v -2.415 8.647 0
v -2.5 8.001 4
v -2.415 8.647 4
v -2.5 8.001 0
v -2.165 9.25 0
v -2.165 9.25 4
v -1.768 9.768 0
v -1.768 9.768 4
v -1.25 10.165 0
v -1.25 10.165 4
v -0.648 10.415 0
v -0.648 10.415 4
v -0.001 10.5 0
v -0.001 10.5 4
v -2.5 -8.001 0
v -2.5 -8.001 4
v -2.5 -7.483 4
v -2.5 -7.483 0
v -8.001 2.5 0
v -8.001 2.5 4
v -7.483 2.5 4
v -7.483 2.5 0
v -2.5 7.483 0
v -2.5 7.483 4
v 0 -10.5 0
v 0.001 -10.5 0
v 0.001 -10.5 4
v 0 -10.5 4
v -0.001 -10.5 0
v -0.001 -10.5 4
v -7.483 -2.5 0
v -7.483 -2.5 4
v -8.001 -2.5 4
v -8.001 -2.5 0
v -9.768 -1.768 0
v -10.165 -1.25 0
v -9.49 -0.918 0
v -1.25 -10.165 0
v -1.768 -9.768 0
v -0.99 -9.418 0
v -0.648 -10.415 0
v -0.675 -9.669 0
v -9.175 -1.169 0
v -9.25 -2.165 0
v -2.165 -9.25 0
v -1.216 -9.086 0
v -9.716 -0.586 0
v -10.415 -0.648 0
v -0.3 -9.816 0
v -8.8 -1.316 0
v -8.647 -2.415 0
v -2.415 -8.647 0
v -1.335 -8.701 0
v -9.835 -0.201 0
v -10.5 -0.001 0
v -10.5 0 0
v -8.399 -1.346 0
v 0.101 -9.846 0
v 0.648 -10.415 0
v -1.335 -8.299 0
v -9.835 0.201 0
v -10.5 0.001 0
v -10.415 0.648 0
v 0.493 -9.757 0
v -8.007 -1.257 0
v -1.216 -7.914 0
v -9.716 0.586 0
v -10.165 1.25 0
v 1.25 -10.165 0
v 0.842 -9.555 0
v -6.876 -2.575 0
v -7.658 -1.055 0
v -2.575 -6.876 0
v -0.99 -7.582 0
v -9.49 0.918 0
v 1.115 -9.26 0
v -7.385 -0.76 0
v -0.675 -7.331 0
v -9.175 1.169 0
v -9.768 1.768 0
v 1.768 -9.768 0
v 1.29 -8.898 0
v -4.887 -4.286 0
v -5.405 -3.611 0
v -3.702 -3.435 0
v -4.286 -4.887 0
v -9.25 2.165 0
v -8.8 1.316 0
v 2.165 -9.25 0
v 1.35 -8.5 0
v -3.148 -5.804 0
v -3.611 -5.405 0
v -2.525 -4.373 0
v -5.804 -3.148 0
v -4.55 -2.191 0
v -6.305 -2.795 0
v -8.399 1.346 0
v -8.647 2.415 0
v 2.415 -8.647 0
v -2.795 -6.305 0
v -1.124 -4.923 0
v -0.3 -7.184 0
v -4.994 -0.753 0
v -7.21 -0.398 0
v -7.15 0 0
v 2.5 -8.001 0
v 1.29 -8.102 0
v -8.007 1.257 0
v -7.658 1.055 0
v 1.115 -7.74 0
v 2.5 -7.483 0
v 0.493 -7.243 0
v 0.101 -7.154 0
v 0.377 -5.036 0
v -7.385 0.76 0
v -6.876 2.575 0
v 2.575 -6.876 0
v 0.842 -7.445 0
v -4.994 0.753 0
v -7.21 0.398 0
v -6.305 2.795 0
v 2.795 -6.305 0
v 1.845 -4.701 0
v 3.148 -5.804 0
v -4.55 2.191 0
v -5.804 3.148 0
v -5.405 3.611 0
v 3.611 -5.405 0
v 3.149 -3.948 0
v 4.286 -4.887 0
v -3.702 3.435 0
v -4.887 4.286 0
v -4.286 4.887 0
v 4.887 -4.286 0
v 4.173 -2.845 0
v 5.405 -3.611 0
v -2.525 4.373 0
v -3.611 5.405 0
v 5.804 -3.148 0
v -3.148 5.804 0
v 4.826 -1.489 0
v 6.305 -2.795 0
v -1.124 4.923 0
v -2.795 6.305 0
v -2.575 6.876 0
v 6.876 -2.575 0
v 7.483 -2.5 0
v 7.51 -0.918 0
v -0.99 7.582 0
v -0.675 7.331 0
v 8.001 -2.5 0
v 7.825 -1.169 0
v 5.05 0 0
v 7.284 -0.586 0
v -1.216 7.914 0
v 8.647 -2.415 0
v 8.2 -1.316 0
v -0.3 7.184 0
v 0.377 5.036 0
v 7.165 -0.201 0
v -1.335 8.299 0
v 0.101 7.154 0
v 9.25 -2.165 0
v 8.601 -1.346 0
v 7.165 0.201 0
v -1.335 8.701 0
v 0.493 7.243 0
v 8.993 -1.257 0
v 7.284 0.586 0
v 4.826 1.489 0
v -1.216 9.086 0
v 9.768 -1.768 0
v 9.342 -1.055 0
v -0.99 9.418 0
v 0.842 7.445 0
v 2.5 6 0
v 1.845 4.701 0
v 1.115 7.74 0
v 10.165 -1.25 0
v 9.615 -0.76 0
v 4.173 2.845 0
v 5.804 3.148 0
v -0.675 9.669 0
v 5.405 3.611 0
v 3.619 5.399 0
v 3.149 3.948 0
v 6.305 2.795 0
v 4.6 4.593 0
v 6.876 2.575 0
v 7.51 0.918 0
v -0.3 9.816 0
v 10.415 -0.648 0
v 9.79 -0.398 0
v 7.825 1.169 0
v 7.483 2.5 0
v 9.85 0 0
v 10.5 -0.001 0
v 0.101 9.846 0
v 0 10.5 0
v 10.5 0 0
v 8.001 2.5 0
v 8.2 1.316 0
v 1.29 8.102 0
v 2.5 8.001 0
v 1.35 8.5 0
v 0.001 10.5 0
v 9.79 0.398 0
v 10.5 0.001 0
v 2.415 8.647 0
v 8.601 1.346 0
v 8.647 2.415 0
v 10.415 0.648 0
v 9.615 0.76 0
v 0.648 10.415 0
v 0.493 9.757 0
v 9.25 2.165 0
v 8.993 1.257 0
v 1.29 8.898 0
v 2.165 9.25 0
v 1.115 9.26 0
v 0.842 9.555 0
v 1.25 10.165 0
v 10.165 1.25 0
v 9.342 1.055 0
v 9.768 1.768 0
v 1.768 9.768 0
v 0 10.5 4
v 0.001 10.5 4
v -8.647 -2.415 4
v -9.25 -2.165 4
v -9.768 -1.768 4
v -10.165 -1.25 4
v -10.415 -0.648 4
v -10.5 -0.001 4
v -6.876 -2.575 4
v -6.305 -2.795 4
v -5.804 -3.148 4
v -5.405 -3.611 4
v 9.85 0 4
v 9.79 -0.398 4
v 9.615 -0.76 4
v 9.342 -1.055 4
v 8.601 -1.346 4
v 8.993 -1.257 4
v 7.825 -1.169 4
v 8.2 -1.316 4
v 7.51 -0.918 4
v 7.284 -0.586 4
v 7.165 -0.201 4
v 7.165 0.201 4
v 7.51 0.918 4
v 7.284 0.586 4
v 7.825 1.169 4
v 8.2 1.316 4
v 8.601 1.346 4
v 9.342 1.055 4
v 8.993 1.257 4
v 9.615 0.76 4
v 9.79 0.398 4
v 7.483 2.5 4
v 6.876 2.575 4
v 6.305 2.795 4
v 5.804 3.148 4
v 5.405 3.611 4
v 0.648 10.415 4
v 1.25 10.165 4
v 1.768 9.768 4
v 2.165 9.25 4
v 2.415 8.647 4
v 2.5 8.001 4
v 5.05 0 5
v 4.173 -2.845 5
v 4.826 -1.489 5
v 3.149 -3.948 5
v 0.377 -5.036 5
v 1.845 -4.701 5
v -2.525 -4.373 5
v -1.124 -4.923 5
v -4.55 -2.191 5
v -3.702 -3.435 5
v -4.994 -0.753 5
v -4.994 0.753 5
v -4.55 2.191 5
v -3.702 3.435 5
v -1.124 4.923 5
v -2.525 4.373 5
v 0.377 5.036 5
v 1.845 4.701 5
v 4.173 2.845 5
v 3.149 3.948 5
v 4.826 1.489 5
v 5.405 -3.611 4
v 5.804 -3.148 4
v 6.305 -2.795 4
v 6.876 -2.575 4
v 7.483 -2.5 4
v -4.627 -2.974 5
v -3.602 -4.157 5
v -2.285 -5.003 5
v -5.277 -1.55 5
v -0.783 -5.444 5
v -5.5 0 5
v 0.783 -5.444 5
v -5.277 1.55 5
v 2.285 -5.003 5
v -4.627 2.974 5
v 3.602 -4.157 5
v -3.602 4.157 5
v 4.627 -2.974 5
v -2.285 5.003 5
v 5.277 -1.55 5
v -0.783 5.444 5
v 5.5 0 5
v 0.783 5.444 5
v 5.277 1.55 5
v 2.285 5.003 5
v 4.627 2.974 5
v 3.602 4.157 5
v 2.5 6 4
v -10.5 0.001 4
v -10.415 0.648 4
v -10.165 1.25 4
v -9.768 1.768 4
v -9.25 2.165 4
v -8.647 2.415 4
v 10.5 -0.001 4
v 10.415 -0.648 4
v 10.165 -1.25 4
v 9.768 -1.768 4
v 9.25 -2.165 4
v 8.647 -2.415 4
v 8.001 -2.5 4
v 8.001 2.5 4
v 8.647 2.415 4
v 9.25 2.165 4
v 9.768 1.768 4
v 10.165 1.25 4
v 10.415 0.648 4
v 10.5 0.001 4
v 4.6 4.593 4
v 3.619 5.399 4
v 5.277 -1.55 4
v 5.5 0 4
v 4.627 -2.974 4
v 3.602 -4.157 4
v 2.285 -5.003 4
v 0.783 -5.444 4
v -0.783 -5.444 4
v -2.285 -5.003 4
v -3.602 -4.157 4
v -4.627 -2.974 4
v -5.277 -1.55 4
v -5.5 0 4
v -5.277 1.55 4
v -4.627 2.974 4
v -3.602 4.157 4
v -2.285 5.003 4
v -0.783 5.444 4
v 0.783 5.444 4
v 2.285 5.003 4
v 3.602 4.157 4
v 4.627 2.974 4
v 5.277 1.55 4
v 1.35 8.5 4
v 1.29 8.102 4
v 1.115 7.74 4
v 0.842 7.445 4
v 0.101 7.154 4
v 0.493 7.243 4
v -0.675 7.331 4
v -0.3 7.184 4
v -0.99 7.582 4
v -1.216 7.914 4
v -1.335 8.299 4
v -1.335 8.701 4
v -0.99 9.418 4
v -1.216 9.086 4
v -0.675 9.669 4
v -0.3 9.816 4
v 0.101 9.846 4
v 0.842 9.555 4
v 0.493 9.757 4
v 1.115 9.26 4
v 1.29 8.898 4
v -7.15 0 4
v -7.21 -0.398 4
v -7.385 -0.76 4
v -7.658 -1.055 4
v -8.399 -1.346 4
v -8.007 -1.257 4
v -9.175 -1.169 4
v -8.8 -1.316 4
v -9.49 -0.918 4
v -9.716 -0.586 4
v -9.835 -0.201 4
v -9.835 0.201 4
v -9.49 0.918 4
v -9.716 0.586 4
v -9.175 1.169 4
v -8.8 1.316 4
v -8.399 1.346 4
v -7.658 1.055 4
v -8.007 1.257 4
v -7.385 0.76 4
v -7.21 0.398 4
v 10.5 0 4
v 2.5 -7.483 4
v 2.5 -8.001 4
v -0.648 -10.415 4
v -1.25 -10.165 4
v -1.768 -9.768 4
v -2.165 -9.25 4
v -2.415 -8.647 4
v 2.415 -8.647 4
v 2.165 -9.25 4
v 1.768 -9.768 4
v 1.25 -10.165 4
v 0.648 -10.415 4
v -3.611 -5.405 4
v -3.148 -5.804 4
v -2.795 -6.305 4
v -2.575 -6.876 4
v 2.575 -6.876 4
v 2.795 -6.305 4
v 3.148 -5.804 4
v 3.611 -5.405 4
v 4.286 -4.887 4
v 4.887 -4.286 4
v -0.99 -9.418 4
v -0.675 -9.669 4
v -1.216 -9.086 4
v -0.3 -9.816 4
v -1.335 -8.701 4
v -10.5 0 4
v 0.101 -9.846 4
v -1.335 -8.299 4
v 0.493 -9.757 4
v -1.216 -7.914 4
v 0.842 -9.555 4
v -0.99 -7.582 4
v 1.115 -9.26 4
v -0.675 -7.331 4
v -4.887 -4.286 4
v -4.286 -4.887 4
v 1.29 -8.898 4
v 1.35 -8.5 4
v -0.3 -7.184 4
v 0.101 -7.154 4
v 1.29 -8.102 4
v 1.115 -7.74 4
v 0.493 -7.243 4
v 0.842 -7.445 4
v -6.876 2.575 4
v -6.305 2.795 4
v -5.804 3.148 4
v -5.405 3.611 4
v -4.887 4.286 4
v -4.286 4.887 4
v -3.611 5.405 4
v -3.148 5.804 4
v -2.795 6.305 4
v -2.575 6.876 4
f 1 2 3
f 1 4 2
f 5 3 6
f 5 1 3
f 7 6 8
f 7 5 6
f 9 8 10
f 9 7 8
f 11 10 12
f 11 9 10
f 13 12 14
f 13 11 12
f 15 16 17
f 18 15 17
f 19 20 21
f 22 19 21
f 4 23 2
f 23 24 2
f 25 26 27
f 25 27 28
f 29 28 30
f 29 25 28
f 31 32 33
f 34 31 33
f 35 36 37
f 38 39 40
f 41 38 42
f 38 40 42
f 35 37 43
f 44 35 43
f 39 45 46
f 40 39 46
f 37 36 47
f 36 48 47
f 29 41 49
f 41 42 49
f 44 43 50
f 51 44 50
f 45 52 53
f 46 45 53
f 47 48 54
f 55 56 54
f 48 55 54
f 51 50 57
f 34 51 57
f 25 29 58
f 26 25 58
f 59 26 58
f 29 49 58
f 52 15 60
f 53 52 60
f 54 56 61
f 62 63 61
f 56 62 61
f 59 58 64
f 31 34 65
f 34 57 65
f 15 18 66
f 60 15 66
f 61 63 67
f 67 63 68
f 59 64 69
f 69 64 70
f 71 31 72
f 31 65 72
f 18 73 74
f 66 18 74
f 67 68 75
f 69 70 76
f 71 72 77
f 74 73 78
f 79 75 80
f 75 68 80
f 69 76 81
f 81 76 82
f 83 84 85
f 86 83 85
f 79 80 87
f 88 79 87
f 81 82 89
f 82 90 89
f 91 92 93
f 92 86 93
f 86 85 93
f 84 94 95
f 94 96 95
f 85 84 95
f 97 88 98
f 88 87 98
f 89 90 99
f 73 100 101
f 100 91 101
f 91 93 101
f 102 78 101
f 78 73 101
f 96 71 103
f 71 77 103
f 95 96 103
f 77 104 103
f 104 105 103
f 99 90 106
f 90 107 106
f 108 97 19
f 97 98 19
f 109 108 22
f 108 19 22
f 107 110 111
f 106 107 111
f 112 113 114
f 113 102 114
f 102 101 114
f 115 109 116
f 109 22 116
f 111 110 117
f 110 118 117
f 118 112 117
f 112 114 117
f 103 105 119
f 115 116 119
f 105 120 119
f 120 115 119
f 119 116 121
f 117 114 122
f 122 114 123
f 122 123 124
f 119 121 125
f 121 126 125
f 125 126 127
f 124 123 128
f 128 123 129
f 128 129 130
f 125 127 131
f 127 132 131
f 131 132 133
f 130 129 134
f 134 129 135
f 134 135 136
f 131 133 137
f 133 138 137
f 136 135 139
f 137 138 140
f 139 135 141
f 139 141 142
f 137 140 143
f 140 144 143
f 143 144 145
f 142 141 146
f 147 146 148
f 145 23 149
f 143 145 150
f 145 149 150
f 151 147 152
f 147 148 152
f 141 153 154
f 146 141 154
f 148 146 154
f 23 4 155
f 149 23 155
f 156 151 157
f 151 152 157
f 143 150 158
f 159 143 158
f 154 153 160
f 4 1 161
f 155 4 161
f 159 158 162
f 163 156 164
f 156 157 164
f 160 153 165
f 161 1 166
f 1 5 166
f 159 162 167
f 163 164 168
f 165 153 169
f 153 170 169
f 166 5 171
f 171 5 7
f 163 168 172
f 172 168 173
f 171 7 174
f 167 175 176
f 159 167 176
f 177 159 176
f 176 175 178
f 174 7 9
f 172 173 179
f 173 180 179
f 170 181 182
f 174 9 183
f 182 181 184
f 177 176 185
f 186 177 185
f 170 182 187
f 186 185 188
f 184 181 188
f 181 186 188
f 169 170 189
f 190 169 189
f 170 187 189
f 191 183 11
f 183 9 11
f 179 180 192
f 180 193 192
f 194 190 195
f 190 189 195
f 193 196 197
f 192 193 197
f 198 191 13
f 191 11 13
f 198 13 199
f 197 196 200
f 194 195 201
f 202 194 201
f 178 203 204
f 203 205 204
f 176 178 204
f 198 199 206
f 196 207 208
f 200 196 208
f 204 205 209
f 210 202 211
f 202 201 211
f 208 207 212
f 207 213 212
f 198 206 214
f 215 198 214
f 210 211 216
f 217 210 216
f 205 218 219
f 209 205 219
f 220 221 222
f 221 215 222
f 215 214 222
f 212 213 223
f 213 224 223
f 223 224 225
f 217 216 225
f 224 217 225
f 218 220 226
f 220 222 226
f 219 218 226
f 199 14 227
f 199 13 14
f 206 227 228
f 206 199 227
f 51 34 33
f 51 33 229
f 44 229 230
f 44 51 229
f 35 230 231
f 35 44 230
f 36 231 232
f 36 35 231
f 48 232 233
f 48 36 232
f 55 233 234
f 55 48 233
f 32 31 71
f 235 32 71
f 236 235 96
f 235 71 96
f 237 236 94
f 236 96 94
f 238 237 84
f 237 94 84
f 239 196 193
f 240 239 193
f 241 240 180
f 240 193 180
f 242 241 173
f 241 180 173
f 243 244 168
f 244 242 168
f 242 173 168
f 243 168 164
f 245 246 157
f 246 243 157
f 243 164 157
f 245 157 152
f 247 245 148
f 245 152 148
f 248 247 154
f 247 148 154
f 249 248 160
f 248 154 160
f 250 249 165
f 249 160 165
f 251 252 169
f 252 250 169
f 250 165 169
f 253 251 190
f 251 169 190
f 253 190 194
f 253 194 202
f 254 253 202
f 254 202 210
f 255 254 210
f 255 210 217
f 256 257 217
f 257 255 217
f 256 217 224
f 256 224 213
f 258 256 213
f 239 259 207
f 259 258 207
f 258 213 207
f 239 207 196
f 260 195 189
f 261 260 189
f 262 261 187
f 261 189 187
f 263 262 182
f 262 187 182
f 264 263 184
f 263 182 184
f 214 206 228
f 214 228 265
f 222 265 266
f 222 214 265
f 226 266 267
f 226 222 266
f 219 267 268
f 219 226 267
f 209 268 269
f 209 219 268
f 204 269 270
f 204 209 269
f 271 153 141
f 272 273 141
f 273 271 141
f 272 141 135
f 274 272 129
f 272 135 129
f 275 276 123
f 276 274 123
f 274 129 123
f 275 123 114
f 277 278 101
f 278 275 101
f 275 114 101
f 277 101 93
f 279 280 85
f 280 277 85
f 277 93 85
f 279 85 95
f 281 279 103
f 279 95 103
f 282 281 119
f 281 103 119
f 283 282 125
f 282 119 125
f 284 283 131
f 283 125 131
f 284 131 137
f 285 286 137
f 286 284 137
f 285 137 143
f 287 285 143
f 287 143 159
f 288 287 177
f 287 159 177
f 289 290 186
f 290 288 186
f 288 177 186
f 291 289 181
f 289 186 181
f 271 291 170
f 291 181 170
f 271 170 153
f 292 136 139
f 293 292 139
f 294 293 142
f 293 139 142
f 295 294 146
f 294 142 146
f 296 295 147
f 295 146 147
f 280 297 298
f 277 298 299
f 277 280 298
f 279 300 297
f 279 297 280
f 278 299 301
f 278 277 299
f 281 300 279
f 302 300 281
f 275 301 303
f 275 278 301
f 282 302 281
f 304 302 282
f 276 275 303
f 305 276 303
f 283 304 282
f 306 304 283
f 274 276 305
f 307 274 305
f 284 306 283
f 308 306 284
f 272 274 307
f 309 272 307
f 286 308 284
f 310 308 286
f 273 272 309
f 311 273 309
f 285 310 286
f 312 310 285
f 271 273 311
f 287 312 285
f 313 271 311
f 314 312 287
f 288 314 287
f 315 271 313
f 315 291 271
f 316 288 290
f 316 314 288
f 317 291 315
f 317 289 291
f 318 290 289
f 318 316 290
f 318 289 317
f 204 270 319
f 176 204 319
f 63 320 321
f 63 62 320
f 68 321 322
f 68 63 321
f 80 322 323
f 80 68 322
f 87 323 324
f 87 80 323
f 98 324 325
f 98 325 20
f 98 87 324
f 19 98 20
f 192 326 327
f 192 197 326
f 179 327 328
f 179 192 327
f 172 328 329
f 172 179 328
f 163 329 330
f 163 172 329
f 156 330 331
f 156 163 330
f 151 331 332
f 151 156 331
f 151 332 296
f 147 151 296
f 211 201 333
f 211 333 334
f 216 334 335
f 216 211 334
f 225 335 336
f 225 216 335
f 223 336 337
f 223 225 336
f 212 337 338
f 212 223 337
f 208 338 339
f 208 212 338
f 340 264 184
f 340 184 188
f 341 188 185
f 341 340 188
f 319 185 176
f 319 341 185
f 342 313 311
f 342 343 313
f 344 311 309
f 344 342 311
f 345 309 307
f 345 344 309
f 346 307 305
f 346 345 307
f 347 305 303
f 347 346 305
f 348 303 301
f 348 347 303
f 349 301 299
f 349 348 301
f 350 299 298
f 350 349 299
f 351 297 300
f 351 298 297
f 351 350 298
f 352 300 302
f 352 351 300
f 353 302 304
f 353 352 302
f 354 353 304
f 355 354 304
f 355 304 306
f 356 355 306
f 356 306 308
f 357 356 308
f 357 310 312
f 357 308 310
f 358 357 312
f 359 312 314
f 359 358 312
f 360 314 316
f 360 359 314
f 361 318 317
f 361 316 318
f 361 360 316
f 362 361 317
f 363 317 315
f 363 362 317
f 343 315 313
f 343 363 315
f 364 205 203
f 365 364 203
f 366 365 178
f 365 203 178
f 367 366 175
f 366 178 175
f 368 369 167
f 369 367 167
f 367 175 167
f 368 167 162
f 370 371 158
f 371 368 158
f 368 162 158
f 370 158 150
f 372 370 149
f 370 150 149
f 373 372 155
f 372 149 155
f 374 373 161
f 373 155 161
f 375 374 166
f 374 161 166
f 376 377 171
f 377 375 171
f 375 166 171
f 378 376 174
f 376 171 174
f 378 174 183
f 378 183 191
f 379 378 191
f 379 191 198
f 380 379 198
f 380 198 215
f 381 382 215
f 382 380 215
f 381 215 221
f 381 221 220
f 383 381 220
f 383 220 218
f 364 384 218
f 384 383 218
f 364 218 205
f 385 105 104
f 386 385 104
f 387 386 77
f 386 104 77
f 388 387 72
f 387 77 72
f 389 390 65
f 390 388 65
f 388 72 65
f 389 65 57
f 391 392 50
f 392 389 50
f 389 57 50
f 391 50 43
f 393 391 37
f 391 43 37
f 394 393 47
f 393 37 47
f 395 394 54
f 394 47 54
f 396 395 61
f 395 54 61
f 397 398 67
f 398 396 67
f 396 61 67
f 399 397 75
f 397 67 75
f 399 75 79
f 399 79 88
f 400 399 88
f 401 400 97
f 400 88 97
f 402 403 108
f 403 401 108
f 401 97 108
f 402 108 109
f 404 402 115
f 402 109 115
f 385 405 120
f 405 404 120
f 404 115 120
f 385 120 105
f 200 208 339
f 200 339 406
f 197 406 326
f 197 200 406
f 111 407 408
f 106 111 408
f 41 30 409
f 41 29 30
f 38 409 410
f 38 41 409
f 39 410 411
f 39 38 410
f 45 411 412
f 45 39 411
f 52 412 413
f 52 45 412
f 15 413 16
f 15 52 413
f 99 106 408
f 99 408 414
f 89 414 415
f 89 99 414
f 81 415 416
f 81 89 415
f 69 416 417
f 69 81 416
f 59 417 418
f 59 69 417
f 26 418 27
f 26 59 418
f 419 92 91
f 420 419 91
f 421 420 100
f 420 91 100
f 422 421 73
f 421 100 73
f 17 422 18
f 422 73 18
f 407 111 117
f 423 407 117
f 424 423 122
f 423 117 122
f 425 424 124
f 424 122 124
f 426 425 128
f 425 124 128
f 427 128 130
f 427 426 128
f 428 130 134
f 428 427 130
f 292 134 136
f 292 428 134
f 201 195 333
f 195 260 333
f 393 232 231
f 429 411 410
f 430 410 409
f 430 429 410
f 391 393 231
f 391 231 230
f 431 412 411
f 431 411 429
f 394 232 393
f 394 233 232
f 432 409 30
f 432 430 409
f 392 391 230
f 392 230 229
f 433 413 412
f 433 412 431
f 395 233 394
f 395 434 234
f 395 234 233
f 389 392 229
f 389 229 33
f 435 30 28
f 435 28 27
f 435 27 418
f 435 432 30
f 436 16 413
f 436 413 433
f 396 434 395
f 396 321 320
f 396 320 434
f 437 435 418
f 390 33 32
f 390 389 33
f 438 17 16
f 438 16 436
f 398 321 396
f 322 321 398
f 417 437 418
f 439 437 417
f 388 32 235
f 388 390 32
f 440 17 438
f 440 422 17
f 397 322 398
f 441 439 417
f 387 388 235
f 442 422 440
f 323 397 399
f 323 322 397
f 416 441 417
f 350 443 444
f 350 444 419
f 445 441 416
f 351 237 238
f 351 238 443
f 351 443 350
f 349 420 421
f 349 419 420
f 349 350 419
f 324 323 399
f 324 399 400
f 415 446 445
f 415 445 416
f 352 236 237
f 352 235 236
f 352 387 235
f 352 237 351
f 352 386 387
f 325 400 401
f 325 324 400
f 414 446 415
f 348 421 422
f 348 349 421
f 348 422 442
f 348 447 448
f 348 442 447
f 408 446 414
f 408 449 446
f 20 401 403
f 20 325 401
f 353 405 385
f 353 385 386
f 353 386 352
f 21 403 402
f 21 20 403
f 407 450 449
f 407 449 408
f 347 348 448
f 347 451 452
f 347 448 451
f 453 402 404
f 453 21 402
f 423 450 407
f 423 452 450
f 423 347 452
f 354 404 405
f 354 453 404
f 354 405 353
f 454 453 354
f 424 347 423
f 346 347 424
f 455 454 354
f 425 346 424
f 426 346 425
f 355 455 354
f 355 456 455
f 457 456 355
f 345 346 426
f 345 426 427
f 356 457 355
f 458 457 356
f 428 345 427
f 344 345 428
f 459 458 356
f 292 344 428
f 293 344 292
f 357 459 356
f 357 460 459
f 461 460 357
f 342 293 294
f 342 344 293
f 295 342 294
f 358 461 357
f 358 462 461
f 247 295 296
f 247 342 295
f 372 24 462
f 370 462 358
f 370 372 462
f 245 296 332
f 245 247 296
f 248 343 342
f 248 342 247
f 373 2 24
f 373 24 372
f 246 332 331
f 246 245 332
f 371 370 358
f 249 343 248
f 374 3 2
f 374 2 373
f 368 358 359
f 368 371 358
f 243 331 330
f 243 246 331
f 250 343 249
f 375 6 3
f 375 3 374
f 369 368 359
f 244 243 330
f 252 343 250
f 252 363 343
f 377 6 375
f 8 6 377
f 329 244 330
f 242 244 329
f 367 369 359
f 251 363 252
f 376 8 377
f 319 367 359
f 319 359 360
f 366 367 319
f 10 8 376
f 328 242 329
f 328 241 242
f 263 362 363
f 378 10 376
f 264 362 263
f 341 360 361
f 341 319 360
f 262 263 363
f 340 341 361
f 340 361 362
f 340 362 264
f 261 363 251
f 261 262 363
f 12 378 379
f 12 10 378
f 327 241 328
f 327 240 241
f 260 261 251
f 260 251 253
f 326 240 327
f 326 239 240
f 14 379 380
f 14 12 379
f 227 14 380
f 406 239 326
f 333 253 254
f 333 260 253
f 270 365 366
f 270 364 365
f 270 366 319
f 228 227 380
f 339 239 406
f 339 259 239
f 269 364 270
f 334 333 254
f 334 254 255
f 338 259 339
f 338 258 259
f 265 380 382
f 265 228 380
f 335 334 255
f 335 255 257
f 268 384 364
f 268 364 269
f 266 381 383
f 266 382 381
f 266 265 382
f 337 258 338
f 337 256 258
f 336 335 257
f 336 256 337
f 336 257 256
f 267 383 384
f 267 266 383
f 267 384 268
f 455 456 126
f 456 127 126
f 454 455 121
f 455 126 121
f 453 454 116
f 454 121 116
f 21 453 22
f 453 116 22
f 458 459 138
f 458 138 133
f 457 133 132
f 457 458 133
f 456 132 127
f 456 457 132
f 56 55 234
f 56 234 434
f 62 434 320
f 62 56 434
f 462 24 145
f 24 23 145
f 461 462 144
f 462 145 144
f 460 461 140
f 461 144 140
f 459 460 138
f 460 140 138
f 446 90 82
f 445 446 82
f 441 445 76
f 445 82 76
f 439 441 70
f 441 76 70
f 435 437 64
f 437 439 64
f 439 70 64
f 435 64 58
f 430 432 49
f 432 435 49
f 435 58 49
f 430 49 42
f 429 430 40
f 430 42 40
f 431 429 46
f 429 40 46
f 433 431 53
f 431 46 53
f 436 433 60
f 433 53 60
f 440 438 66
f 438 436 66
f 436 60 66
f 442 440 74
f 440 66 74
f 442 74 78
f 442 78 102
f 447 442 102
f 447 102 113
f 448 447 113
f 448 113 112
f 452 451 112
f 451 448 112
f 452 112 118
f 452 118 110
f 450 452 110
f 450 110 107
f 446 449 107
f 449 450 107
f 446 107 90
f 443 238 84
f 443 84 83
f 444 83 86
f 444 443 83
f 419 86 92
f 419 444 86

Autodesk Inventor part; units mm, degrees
ref_plane "YZ Plane" through (0, 0, 0) normal (1, 0, 0) x (0, 1, 0)
ref_plane "XZ Plane" through (0, 0, 0) normal (0, 1, 0) x (-1, 0, 0)
ref_plane "XY Plane" through (0, 0, 0) normal (0, 0, 1) x (1, 0, 0)
sketch "スケッチ1" plane through (0, 0, 0) normal (0, 0, 1) x (1, 0, 0)
  circle A0 centre (0, 0) radius 10.5
  circle A1 centre (0, 0) radius 5.05
  circle A2 centre (0, 8.5) radius 1.35
  circle A3 centre (-6.0104, 6.0104) radius 1.04
  line L0 (0, 8.5) -> (0, 0) construction
  line L1 (0, 0) -> (-6.0104, 6.0104) construction
  circle A4 centre (0, 0) radius 8.5 construction
  circle A5 centre (-8.5, 0) radius 1.35
  circle A6 centre (-6.0104, -6.0104) radius 1.04
  circle A7 centre (0, -8.5) radius 1.35
  circle A8 centre (6.0104, -6.0104) radius 1.04
  circle A9 centre (8.5, 0) radius 1.35
  circle A10 centre (6.0104, 6.0104) radius 1.04
  dimension "d0" = 21
  dimension "d1" = 10.1
  dimension "d2" = 2.7
  dimension "d3" = 45
  dimension "d4" = 2.08
  dimension "d5" = 17
  dimension "d8" = 360
extrude "押し出し1" add sketch "スケッチ1" along normal blind 4 contours A0 | A3 | A6 | A8 | A10
sketch "スケッチ2" plane through (0, 0, 4) normal (0, 0, 1) x (1, 0, 0)
  circle A0 centre (0, 0) radius 5.05 projected
  circle A1 centre (0, 0) radius 10.5 projected
  circle A2 centre (0, 0) radius 5.5
  dimension "d12" = 11
extrude "押し出し2" add sketch "スケッチ2" along normal blind 1 contours A2
sketch "スケッチ4" plane through (0, 0, 4) normal (0, 0, 1) x (1, 0, 0)
  circle A0 centre (0, 0) radius 5.5 projected
  circle A1 centre (-8.5, 0) radius 1.35 projected
  circle A2 centre (0, 8.5) radius 1.35 projected
  circle A3 centre (0, 0) radius 10.5 projected
  line L0 (0, 8.5) -> (0, 0) construction
  line L1 (0, 0) -> (-8.5, 0) construction
  line L2 (0, 0) -> (-7.4246, 7.4246) construction
  circle A4 centre (0, 0) radius 10.5 construction
  line L3 (-12.2474, 2.5) -> (-6, 2.5)
  line L4 (-2.5, 6) -> (-2.5, 12.2474)
  arc A5 (-2.5, 12.2474) -> (-12.2474, 2.5) centre (0, 0) ccw
  arc A6 (-2.5, 6) -> (-6, 2.5) centre (0, 0) ccw
  circle A7 centre (0, 0) radius 5.5 projected
  line L5 (-2.5, -12.2474) -> (-2.5, -6)
  line L6 (-6, -2.5) -> (-12.2474, -2.5)
  arc A8 (-12.2474, -2.5) -> (-2.5, -12.2474) centre (0, 0) ccw
  arc A9 (-6, -2.5) -> (-2.5, -6) centre (0, 0) ccw
  line L7 (12.2474, -2.5) -> (6, -2.5)
  line L8 (2.5, -6) -> (2.5, -12.2474)
  arc A10 (2.5, -12.2474) -> (12.2474, -2.5) centre (0, 0) ccw
  arc A11 (2.5, -6) -> (6, -2.5) centre (0, 0) ccw
  line L9 (2.5, 12.2474) -> (2.5, 6)
  line L10 (6, 2.5) -> (12.2474, 2.5)
  arc A12 (12.2474, 2.5) -> (2.5, 12.2474) centre (0, 0) ccw
  arc A13 (6, 2.5) -> (2.5, 6) centre (0, 0) ccw
  dimension "d24" = 45
  dimension "d25" = 2.5
  dimension "d26" = 2.5
  dimension "d27" = 2
  dimension "d30" = 360
  dimension "d35" = 1
extrude "押し出し4" cut sketch "スケッチ4" against normal blind 10 contours L10 A13 L9 A3 | A3 L9 A12 L10 | L7 A10 L8 A3 | A3 L8 A11 L7 | L4 A6 L3 A3 | A3 L3 A5 L4 | L5 A8 L6 A3 | A3 L6 A9 L5
fillet "フィレット2" radius 2.5 15 edges at (2.5, -6, 2) (2.5, -10.198, 2) (-2.5, -10.198, 2) (-2.5, -6, 2) (6, -2.5, 2) (6, 2.5, 2) (10.198, -2.5, 2) (10.198, 2.5, 2) (2.5, 10.198, 2) (-2.5, 10.198, 2) (-2.5, 6, 2) (-6, 2.5, 2) (-10.198, -2.5, 2) (-10.198, 2.5, 2) (-6, -2.5, 2)
equation "\"d26\" = d25"
properties part number "リンク_ふくらはぎ_サブフレーム_1_4" material "アルミニウム 2014-T4"
